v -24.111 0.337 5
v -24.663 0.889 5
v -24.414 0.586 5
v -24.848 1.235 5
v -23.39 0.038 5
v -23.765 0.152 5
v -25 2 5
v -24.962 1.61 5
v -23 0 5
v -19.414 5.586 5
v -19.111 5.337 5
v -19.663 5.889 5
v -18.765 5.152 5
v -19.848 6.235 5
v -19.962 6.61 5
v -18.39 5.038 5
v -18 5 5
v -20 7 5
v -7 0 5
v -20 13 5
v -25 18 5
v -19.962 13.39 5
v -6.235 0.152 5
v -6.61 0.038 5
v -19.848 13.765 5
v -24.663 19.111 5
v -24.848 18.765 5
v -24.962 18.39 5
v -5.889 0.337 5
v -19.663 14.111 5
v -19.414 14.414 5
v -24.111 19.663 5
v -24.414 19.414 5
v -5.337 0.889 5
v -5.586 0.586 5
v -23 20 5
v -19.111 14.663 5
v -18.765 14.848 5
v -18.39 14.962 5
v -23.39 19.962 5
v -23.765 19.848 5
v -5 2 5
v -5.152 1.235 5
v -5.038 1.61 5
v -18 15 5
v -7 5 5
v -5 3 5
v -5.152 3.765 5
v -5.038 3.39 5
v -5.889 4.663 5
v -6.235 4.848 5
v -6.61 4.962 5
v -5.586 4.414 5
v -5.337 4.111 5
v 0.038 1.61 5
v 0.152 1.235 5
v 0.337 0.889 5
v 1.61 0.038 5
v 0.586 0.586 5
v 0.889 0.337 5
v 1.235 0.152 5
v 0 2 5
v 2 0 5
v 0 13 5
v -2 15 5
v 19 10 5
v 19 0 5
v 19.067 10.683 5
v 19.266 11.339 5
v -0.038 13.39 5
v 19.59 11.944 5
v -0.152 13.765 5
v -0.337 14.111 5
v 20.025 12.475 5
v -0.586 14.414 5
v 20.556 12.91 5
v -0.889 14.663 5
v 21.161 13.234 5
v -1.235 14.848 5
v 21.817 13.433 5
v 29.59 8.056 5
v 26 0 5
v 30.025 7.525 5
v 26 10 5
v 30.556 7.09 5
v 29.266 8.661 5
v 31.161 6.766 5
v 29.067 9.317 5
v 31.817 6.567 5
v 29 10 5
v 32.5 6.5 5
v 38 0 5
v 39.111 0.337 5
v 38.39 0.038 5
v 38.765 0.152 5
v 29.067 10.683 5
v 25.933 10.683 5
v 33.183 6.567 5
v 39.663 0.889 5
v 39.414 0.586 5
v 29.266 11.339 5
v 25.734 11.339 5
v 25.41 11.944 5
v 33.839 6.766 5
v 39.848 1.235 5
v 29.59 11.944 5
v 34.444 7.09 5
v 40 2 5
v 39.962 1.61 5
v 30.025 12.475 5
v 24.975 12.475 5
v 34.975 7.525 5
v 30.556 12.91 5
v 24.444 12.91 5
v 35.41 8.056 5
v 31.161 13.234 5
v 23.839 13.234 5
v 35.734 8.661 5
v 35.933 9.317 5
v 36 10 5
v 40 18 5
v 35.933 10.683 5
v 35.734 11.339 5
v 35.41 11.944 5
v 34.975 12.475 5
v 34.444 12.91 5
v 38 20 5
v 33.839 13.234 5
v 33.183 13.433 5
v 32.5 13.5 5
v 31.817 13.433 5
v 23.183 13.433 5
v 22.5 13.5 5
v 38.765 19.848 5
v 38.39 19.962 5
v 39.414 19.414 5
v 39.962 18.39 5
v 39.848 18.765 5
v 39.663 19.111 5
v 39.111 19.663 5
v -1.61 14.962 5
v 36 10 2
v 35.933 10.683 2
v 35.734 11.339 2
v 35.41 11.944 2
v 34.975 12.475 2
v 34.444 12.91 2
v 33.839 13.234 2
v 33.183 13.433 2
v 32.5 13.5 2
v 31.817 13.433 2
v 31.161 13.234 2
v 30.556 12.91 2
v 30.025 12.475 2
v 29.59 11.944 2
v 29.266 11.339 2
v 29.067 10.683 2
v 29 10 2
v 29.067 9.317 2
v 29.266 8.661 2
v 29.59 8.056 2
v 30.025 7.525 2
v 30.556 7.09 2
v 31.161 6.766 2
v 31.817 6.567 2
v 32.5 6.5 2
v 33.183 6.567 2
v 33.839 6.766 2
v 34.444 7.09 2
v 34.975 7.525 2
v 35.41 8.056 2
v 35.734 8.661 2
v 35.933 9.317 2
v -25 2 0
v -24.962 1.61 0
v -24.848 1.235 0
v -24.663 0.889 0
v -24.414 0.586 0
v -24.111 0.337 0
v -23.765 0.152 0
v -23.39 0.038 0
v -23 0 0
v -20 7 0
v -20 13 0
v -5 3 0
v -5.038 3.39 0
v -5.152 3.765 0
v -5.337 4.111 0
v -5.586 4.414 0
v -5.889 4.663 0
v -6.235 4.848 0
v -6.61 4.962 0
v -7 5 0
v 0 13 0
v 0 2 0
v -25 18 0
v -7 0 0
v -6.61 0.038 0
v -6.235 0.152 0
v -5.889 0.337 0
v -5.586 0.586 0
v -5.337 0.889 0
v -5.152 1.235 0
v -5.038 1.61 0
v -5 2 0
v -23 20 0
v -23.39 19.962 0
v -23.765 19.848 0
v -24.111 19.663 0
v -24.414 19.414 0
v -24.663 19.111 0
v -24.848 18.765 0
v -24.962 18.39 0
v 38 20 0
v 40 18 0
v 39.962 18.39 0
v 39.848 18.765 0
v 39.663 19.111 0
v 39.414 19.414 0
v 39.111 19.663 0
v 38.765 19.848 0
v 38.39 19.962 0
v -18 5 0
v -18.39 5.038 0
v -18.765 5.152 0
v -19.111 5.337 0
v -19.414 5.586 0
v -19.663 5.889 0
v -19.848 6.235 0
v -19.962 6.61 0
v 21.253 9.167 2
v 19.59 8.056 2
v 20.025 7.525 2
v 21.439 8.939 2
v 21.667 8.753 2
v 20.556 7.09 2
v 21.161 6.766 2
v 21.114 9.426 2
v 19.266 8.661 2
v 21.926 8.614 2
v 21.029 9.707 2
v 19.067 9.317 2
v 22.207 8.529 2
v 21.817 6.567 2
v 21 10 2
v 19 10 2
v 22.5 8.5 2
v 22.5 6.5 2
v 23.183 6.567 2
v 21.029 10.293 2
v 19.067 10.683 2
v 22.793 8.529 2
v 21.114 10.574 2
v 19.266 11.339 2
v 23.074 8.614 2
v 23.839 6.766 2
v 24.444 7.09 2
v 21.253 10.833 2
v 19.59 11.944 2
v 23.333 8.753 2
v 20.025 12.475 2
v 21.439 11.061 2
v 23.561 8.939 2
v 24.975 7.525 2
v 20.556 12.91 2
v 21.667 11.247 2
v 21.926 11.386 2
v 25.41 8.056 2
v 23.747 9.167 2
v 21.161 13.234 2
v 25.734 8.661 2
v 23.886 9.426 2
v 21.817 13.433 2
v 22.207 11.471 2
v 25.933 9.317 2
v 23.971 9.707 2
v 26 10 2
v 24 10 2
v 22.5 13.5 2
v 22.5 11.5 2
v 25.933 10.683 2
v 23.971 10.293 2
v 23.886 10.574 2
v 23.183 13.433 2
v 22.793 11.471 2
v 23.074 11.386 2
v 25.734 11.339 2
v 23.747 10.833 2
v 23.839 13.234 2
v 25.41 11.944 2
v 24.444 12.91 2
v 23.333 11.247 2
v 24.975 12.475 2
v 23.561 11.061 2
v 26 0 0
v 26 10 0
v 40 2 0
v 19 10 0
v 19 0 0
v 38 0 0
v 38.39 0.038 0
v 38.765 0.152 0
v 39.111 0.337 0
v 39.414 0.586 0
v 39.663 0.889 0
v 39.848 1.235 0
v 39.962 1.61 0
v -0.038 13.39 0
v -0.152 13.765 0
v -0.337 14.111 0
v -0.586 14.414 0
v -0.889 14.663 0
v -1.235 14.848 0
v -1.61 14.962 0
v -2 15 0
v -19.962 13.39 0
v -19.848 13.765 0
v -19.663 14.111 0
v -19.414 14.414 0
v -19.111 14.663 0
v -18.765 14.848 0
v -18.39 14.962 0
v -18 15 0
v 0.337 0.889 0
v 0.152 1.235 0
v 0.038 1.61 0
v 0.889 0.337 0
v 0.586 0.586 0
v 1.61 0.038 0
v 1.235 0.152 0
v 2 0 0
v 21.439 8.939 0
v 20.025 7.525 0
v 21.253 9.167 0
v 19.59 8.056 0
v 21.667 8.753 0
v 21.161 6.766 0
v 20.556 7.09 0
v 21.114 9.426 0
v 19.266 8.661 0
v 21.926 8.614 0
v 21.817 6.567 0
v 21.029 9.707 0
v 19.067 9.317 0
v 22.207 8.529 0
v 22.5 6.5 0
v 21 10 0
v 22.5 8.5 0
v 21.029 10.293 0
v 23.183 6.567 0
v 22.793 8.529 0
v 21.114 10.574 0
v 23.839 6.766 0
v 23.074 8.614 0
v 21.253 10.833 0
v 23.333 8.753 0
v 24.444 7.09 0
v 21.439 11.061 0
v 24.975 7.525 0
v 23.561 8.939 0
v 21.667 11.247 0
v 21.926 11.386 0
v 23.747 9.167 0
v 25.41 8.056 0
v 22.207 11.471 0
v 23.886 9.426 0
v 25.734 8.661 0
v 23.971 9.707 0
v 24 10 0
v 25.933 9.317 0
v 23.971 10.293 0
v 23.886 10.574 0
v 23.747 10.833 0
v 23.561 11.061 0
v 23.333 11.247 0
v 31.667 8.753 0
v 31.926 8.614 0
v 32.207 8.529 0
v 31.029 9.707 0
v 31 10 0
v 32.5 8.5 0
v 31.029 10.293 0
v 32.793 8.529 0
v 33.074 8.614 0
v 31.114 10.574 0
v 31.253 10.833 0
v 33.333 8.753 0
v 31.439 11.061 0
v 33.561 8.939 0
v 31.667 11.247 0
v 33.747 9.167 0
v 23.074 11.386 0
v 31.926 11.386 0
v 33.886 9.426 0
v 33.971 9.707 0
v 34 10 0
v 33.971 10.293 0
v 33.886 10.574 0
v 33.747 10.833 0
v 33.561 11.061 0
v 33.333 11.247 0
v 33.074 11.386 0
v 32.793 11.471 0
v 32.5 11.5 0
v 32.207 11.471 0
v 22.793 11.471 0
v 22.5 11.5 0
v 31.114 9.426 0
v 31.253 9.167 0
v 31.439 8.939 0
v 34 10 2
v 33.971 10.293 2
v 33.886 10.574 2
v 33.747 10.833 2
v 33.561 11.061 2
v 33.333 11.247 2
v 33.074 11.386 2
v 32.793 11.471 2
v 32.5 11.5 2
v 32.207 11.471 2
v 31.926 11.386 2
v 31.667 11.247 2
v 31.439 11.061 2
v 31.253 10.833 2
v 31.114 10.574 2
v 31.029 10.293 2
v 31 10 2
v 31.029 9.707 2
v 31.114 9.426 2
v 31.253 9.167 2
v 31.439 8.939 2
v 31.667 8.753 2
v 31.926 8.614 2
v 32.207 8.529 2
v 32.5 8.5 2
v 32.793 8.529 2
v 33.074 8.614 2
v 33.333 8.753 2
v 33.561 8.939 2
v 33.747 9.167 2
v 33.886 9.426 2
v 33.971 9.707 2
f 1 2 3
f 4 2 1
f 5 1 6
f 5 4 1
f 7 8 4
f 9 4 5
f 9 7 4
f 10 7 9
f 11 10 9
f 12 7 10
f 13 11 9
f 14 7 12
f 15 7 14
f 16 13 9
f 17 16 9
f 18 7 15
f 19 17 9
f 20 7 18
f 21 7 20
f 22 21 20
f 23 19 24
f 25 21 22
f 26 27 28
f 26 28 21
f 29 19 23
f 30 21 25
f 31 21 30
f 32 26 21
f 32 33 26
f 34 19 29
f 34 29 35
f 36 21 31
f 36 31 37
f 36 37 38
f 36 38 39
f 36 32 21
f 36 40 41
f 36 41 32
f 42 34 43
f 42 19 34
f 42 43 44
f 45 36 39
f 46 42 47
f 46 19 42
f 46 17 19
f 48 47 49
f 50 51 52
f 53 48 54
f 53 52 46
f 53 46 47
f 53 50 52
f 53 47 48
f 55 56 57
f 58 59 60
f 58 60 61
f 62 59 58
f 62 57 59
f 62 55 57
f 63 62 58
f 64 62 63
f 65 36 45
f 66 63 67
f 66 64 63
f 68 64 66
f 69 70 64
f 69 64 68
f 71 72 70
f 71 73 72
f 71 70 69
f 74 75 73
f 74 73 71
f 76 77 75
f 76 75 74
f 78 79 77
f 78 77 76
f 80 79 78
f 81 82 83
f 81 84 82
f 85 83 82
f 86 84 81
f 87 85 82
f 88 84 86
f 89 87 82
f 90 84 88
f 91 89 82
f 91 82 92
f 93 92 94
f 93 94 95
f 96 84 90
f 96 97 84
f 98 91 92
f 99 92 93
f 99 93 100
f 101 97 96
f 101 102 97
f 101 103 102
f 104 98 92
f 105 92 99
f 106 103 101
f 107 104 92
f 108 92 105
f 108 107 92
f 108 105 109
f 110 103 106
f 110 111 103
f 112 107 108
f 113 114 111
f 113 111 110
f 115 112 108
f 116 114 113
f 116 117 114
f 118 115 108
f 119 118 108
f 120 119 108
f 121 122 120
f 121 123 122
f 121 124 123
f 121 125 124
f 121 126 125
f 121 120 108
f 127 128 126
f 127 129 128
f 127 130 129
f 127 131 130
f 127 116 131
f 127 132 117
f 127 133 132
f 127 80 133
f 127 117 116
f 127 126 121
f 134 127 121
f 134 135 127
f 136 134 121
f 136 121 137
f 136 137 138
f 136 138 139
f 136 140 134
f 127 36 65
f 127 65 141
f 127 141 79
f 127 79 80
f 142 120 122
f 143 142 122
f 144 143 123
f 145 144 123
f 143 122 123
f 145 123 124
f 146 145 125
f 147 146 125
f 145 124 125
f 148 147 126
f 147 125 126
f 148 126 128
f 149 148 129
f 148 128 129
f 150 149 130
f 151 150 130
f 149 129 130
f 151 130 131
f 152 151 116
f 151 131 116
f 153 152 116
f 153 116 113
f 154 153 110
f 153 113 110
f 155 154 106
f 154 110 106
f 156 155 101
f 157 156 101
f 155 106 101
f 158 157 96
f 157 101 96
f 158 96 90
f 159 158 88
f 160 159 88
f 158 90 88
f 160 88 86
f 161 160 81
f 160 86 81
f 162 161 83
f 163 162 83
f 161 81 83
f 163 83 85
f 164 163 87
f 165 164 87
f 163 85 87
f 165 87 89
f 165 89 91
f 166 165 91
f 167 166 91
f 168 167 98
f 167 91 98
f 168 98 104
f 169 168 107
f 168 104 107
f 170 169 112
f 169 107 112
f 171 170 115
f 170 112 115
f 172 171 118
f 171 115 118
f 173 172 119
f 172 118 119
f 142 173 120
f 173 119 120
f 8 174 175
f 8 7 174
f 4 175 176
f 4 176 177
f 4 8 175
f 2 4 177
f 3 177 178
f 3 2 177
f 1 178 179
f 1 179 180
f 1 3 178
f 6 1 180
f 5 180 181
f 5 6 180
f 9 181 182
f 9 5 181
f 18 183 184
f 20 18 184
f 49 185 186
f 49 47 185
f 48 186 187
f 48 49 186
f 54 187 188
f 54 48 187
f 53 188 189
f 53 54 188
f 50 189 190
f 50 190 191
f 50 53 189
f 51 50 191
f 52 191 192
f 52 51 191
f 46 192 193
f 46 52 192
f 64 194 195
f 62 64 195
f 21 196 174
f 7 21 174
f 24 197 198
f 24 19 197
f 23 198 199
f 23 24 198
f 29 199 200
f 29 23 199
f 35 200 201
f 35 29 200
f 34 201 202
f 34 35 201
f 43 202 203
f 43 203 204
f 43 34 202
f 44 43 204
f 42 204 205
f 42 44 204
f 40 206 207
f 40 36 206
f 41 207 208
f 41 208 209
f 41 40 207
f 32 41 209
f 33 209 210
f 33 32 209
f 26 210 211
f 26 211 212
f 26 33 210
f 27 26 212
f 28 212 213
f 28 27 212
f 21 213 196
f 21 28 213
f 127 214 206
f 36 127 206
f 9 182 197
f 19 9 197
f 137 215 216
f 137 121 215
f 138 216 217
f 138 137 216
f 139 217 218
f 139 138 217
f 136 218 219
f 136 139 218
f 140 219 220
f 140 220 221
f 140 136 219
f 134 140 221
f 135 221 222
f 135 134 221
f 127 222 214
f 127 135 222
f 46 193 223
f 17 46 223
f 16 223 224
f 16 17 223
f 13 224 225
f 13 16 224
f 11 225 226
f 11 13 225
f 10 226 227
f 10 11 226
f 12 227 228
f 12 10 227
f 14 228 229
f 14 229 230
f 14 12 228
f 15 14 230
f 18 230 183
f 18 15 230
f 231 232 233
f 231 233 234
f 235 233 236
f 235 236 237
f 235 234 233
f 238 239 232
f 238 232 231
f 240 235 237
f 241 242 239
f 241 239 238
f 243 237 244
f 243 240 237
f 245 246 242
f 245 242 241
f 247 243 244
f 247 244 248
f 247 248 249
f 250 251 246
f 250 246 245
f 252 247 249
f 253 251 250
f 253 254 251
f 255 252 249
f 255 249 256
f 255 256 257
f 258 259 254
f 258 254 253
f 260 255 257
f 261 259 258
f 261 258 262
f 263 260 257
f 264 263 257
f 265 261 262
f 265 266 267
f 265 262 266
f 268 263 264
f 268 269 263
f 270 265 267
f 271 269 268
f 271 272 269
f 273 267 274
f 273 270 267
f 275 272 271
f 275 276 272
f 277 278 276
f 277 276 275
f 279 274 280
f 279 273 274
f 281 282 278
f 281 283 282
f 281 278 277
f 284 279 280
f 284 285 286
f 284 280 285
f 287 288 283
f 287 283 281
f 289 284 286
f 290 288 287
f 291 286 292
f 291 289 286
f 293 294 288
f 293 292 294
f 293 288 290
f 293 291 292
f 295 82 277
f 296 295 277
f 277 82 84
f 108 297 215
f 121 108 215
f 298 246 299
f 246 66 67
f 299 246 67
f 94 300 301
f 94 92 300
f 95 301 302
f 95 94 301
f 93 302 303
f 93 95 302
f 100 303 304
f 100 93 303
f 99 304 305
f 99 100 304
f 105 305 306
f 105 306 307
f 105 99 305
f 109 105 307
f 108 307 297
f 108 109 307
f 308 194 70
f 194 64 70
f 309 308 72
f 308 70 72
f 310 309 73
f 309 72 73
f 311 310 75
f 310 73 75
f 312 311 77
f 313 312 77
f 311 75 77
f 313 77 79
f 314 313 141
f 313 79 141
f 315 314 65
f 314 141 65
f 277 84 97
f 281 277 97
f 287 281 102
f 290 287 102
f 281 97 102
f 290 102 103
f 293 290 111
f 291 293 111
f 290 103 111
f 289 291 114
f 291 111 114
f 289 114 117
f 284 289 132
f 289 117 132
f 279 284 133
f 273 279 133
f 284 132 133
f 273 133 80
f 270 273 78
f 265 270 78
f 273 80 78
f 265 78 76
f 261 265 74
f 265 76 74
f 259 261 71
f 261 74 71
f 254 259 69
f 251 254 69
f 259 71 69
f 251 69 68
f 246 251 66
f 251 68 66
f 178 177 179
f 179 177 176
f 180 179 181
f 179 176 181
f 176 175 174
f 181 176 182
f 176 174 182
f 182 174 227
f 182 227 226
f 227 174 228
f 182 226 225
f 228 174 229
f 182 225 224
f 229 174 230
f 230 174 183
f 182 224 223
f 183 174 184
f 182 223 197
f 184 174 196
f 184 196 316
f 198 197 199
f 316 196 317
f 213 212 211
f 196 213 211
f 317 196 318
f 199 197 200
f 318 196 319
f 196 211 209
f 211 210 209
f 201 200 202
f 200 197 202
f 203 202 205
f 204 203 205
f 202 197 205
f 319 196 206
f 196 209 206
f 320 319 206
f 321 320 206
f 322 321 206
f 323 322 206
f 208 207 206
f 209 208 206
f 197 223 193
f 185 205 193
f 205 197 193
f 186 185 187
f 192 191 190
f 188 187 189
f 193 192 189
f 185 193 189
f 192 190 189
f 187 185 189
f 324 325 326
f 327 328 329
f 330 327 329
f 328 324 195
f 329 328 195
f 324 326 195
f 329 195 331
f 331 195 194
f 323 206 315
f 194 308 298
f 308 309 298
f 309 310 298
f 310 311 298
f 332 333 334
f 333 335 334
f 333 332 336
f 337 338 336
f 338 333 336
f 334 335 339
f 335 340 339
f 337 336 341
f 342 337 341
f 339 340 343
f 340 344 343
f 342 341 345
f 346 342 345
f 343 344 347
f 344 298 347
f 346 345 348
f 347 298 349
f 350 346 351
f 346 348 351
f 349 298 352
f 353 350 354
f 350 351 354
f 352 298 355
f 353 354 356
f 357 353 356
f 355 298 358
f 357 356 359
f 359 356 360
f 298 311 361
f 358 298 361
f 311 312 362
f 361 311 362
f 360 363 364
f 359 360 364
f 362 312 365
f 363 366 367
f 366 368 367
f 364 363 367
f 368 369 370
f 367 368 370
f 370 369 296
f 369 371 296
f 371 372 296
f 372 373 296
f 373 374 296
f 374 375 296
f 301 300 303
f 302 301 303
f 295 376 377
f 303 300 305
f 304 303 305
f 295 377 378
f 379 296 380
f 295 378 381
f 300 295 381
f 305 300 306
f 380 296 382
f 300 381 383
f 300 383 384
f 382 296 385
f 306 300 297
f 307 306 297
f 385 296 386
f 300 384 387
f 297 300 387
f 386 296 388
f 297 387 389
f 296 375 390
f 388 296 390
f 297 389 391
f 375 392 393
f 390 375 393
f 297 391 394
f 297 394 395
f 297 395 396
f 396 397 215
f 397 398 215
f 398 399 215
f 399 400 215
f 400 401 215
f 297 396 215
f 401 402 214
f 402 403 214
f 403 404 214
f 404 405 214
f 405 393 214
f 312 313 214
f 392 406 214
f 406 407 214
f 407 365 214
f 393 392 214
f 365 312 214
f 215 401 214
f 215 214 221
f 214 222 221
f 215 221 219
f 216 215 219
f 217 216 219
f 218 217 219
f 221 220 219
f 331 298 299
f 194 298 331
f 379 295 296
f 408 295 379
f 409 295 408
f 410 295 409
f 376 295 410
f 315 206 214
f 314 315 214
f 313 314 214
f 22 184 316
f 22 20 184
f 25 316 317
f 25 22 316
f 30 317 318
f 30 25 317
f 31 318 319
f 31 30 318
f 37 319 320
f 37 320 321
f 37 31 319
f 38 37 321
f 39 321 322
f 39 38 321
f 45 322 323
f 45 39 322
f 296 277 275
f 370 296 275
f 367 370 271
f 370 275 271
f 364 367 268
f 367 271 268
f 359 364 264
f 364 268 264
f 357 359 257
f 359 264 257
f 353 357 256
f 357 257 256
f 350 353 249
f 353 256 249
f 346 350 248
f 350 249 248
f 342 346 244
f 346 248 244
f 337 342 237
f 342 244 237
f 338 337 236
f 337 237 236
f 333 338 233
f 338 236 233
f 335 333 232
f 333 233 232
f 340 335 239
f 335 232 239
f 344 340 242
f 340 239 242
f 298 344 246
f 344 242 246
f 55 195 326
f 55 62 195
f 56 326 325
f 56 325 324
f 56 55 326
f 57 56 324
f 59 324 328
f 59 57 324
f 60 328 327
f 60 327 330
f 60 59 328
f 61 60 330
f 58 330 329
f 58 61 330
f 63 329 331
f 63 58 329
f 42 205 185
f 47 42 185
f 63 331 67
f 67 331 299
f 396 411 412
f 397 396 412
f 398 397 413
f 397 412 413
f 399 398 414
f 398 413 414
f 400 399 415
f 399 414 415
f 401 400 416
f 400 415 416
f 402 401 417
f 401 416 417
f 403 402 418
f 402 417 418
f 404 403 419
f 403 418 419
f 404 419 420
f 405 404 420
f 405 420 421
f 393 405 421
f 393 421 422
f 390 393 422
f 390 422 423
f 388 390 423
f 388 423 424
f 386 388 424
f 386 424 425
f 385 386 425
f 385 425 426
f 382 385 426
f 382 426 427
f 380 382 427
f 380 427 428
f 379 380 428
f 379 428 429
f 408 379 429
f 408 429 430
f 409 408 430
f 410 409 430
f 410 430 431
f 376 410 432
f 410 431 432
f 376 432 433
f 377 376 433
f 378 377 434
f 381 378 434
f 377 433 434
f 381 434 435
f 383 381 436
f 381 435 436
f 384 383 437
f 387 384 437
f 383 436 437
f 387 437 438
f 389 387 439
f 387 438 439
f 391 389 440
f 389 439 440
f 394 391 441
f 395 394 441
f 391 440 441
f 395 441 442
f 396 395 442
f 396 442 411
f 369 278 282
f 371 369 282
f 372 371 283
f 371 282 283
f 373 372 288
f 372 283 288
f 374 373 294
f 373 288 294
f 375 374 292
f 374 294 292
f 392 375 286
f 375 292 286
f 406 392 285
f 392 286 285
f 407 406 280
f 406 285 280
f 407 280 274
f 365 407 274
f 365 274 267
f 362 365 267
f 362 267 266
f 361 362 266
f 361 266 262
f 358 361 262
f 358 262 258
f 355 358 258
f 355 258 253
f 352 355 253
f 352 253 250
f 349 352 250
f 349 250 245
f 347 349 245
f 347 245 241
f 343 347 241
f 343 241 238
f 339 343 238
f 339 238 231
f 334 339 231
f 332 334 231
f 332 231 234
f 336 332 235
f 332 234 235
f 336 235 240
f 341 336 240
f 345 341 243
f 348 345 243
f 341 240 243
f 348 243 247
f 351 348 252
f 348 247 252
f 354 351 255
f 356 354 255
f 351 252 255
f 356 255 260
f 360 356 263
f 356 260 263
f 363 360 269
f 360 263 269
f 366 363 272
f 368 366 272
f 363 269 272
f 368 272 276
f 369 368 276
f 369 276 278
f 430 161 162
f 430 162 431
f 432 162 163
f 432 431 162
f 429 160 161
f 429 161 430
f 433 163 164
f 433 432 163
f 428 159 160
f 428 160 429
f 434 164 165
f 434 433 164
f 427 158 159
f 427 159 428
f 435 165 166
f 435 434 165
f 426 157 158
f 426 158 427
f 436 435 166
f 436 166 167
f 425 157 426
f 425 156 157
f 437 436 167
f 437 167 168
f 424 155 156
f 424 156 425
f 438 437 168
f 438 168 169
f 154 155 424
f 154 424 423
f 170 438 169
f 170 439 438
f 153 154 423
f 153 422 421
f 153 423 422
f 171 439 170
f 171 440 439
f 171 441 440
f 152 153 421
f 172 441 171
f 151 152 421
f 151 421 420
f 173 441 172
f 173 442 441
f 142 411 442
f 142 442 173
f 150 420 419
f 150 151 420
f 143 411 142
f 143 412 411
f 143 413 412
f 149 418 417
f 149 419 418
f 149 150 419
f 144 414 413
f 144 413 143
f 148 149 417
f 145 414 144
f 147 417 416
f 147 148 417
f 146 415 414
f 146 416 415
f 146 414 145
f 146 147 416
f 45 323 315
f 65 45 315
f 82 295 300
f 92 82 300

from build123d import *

# Parameters (mm, degrees)
F1_DEPTH = 5
F2_R     = 2
F3_R     = 1.5
F4_DEPTH = 5.001
F3_R_2   = 3.5
F5_DEPTH = 3
F7_DEPTH = 5


with BuildPart() as f1:
    # F0 (on Top) → F1 (new body)
    with BuildSketch(Plane.XY):
        Polygon((0, 15), (0, 0), (40, 0), (40, 20), (0, 20), (-25, 20), (-25, 0), (-5, 0), (-5, 5), (-20, 5), (-20, 15), align=None)
    extrude(amount=F1_DEPTH)

    # F2
    f2_edges = [f1.edges().sort_by_distance(p)[0] for p in [
        (-25, 0, 2.5),
        (-25, 20, 2.5),
        (40, 0, 2.5),
        (40, 20, 2.5),
        (0, 0, 2.5),
        (0, 15, 2.5),
        (-5, 0, 2.5),
        (-20, 5, 2.5),
        (-5, 5, 2.5),
        (-20, 15, 2.5),
    ]]
    fillet(f2_edges, radius=F2_R)

    # F3 (on face) → F4 (cut, through all)
    with BuildSketch(Plane.XY.offset(5)):
        with Locations((32.5, 10)):
            Circle(F3_R)
        with Locations((22.5, 10)):
            Circle(F3_R)
    extrude(amount=-F4_DEPTH, mode=Mode.SUBTRACT)

    # F3 (on face) → F5 (cut)
    with BuildSketch(Plane.XY.offset(5)):
        with Locations((22.5, 10)):
            Circle(F3_R_2)
        with Locations((22.5, 10)):
            Circle(F3_R, mode=Mode.SUBTRACT)
        with Locations((32.5, 10)):
            Circle(F3_R_2)
        with Locations((32.5, 10)):
            Circle(F3_R, mode=Mode.SUBTRACT)
    extrude(amount=-F5_DEPTH, mode=Mode.SUBTRACT)

    # F6 (on face) → F7 (cut, through all)
    with BuildSketch(Plane.XY.offset(5)):
        with BuildLine():
            ThreePointArc((26, 10), (22.5, 6.5), (19, 10))
            Line((19, 10), (19, 0))
            Line((19, 0), (26, 0))
            Line((26, 0), (26, 10))
        make_face()
    extrude(amount=-F7_DEPTH, mode=Mode.SUBTRACT)


solid = f1.part
